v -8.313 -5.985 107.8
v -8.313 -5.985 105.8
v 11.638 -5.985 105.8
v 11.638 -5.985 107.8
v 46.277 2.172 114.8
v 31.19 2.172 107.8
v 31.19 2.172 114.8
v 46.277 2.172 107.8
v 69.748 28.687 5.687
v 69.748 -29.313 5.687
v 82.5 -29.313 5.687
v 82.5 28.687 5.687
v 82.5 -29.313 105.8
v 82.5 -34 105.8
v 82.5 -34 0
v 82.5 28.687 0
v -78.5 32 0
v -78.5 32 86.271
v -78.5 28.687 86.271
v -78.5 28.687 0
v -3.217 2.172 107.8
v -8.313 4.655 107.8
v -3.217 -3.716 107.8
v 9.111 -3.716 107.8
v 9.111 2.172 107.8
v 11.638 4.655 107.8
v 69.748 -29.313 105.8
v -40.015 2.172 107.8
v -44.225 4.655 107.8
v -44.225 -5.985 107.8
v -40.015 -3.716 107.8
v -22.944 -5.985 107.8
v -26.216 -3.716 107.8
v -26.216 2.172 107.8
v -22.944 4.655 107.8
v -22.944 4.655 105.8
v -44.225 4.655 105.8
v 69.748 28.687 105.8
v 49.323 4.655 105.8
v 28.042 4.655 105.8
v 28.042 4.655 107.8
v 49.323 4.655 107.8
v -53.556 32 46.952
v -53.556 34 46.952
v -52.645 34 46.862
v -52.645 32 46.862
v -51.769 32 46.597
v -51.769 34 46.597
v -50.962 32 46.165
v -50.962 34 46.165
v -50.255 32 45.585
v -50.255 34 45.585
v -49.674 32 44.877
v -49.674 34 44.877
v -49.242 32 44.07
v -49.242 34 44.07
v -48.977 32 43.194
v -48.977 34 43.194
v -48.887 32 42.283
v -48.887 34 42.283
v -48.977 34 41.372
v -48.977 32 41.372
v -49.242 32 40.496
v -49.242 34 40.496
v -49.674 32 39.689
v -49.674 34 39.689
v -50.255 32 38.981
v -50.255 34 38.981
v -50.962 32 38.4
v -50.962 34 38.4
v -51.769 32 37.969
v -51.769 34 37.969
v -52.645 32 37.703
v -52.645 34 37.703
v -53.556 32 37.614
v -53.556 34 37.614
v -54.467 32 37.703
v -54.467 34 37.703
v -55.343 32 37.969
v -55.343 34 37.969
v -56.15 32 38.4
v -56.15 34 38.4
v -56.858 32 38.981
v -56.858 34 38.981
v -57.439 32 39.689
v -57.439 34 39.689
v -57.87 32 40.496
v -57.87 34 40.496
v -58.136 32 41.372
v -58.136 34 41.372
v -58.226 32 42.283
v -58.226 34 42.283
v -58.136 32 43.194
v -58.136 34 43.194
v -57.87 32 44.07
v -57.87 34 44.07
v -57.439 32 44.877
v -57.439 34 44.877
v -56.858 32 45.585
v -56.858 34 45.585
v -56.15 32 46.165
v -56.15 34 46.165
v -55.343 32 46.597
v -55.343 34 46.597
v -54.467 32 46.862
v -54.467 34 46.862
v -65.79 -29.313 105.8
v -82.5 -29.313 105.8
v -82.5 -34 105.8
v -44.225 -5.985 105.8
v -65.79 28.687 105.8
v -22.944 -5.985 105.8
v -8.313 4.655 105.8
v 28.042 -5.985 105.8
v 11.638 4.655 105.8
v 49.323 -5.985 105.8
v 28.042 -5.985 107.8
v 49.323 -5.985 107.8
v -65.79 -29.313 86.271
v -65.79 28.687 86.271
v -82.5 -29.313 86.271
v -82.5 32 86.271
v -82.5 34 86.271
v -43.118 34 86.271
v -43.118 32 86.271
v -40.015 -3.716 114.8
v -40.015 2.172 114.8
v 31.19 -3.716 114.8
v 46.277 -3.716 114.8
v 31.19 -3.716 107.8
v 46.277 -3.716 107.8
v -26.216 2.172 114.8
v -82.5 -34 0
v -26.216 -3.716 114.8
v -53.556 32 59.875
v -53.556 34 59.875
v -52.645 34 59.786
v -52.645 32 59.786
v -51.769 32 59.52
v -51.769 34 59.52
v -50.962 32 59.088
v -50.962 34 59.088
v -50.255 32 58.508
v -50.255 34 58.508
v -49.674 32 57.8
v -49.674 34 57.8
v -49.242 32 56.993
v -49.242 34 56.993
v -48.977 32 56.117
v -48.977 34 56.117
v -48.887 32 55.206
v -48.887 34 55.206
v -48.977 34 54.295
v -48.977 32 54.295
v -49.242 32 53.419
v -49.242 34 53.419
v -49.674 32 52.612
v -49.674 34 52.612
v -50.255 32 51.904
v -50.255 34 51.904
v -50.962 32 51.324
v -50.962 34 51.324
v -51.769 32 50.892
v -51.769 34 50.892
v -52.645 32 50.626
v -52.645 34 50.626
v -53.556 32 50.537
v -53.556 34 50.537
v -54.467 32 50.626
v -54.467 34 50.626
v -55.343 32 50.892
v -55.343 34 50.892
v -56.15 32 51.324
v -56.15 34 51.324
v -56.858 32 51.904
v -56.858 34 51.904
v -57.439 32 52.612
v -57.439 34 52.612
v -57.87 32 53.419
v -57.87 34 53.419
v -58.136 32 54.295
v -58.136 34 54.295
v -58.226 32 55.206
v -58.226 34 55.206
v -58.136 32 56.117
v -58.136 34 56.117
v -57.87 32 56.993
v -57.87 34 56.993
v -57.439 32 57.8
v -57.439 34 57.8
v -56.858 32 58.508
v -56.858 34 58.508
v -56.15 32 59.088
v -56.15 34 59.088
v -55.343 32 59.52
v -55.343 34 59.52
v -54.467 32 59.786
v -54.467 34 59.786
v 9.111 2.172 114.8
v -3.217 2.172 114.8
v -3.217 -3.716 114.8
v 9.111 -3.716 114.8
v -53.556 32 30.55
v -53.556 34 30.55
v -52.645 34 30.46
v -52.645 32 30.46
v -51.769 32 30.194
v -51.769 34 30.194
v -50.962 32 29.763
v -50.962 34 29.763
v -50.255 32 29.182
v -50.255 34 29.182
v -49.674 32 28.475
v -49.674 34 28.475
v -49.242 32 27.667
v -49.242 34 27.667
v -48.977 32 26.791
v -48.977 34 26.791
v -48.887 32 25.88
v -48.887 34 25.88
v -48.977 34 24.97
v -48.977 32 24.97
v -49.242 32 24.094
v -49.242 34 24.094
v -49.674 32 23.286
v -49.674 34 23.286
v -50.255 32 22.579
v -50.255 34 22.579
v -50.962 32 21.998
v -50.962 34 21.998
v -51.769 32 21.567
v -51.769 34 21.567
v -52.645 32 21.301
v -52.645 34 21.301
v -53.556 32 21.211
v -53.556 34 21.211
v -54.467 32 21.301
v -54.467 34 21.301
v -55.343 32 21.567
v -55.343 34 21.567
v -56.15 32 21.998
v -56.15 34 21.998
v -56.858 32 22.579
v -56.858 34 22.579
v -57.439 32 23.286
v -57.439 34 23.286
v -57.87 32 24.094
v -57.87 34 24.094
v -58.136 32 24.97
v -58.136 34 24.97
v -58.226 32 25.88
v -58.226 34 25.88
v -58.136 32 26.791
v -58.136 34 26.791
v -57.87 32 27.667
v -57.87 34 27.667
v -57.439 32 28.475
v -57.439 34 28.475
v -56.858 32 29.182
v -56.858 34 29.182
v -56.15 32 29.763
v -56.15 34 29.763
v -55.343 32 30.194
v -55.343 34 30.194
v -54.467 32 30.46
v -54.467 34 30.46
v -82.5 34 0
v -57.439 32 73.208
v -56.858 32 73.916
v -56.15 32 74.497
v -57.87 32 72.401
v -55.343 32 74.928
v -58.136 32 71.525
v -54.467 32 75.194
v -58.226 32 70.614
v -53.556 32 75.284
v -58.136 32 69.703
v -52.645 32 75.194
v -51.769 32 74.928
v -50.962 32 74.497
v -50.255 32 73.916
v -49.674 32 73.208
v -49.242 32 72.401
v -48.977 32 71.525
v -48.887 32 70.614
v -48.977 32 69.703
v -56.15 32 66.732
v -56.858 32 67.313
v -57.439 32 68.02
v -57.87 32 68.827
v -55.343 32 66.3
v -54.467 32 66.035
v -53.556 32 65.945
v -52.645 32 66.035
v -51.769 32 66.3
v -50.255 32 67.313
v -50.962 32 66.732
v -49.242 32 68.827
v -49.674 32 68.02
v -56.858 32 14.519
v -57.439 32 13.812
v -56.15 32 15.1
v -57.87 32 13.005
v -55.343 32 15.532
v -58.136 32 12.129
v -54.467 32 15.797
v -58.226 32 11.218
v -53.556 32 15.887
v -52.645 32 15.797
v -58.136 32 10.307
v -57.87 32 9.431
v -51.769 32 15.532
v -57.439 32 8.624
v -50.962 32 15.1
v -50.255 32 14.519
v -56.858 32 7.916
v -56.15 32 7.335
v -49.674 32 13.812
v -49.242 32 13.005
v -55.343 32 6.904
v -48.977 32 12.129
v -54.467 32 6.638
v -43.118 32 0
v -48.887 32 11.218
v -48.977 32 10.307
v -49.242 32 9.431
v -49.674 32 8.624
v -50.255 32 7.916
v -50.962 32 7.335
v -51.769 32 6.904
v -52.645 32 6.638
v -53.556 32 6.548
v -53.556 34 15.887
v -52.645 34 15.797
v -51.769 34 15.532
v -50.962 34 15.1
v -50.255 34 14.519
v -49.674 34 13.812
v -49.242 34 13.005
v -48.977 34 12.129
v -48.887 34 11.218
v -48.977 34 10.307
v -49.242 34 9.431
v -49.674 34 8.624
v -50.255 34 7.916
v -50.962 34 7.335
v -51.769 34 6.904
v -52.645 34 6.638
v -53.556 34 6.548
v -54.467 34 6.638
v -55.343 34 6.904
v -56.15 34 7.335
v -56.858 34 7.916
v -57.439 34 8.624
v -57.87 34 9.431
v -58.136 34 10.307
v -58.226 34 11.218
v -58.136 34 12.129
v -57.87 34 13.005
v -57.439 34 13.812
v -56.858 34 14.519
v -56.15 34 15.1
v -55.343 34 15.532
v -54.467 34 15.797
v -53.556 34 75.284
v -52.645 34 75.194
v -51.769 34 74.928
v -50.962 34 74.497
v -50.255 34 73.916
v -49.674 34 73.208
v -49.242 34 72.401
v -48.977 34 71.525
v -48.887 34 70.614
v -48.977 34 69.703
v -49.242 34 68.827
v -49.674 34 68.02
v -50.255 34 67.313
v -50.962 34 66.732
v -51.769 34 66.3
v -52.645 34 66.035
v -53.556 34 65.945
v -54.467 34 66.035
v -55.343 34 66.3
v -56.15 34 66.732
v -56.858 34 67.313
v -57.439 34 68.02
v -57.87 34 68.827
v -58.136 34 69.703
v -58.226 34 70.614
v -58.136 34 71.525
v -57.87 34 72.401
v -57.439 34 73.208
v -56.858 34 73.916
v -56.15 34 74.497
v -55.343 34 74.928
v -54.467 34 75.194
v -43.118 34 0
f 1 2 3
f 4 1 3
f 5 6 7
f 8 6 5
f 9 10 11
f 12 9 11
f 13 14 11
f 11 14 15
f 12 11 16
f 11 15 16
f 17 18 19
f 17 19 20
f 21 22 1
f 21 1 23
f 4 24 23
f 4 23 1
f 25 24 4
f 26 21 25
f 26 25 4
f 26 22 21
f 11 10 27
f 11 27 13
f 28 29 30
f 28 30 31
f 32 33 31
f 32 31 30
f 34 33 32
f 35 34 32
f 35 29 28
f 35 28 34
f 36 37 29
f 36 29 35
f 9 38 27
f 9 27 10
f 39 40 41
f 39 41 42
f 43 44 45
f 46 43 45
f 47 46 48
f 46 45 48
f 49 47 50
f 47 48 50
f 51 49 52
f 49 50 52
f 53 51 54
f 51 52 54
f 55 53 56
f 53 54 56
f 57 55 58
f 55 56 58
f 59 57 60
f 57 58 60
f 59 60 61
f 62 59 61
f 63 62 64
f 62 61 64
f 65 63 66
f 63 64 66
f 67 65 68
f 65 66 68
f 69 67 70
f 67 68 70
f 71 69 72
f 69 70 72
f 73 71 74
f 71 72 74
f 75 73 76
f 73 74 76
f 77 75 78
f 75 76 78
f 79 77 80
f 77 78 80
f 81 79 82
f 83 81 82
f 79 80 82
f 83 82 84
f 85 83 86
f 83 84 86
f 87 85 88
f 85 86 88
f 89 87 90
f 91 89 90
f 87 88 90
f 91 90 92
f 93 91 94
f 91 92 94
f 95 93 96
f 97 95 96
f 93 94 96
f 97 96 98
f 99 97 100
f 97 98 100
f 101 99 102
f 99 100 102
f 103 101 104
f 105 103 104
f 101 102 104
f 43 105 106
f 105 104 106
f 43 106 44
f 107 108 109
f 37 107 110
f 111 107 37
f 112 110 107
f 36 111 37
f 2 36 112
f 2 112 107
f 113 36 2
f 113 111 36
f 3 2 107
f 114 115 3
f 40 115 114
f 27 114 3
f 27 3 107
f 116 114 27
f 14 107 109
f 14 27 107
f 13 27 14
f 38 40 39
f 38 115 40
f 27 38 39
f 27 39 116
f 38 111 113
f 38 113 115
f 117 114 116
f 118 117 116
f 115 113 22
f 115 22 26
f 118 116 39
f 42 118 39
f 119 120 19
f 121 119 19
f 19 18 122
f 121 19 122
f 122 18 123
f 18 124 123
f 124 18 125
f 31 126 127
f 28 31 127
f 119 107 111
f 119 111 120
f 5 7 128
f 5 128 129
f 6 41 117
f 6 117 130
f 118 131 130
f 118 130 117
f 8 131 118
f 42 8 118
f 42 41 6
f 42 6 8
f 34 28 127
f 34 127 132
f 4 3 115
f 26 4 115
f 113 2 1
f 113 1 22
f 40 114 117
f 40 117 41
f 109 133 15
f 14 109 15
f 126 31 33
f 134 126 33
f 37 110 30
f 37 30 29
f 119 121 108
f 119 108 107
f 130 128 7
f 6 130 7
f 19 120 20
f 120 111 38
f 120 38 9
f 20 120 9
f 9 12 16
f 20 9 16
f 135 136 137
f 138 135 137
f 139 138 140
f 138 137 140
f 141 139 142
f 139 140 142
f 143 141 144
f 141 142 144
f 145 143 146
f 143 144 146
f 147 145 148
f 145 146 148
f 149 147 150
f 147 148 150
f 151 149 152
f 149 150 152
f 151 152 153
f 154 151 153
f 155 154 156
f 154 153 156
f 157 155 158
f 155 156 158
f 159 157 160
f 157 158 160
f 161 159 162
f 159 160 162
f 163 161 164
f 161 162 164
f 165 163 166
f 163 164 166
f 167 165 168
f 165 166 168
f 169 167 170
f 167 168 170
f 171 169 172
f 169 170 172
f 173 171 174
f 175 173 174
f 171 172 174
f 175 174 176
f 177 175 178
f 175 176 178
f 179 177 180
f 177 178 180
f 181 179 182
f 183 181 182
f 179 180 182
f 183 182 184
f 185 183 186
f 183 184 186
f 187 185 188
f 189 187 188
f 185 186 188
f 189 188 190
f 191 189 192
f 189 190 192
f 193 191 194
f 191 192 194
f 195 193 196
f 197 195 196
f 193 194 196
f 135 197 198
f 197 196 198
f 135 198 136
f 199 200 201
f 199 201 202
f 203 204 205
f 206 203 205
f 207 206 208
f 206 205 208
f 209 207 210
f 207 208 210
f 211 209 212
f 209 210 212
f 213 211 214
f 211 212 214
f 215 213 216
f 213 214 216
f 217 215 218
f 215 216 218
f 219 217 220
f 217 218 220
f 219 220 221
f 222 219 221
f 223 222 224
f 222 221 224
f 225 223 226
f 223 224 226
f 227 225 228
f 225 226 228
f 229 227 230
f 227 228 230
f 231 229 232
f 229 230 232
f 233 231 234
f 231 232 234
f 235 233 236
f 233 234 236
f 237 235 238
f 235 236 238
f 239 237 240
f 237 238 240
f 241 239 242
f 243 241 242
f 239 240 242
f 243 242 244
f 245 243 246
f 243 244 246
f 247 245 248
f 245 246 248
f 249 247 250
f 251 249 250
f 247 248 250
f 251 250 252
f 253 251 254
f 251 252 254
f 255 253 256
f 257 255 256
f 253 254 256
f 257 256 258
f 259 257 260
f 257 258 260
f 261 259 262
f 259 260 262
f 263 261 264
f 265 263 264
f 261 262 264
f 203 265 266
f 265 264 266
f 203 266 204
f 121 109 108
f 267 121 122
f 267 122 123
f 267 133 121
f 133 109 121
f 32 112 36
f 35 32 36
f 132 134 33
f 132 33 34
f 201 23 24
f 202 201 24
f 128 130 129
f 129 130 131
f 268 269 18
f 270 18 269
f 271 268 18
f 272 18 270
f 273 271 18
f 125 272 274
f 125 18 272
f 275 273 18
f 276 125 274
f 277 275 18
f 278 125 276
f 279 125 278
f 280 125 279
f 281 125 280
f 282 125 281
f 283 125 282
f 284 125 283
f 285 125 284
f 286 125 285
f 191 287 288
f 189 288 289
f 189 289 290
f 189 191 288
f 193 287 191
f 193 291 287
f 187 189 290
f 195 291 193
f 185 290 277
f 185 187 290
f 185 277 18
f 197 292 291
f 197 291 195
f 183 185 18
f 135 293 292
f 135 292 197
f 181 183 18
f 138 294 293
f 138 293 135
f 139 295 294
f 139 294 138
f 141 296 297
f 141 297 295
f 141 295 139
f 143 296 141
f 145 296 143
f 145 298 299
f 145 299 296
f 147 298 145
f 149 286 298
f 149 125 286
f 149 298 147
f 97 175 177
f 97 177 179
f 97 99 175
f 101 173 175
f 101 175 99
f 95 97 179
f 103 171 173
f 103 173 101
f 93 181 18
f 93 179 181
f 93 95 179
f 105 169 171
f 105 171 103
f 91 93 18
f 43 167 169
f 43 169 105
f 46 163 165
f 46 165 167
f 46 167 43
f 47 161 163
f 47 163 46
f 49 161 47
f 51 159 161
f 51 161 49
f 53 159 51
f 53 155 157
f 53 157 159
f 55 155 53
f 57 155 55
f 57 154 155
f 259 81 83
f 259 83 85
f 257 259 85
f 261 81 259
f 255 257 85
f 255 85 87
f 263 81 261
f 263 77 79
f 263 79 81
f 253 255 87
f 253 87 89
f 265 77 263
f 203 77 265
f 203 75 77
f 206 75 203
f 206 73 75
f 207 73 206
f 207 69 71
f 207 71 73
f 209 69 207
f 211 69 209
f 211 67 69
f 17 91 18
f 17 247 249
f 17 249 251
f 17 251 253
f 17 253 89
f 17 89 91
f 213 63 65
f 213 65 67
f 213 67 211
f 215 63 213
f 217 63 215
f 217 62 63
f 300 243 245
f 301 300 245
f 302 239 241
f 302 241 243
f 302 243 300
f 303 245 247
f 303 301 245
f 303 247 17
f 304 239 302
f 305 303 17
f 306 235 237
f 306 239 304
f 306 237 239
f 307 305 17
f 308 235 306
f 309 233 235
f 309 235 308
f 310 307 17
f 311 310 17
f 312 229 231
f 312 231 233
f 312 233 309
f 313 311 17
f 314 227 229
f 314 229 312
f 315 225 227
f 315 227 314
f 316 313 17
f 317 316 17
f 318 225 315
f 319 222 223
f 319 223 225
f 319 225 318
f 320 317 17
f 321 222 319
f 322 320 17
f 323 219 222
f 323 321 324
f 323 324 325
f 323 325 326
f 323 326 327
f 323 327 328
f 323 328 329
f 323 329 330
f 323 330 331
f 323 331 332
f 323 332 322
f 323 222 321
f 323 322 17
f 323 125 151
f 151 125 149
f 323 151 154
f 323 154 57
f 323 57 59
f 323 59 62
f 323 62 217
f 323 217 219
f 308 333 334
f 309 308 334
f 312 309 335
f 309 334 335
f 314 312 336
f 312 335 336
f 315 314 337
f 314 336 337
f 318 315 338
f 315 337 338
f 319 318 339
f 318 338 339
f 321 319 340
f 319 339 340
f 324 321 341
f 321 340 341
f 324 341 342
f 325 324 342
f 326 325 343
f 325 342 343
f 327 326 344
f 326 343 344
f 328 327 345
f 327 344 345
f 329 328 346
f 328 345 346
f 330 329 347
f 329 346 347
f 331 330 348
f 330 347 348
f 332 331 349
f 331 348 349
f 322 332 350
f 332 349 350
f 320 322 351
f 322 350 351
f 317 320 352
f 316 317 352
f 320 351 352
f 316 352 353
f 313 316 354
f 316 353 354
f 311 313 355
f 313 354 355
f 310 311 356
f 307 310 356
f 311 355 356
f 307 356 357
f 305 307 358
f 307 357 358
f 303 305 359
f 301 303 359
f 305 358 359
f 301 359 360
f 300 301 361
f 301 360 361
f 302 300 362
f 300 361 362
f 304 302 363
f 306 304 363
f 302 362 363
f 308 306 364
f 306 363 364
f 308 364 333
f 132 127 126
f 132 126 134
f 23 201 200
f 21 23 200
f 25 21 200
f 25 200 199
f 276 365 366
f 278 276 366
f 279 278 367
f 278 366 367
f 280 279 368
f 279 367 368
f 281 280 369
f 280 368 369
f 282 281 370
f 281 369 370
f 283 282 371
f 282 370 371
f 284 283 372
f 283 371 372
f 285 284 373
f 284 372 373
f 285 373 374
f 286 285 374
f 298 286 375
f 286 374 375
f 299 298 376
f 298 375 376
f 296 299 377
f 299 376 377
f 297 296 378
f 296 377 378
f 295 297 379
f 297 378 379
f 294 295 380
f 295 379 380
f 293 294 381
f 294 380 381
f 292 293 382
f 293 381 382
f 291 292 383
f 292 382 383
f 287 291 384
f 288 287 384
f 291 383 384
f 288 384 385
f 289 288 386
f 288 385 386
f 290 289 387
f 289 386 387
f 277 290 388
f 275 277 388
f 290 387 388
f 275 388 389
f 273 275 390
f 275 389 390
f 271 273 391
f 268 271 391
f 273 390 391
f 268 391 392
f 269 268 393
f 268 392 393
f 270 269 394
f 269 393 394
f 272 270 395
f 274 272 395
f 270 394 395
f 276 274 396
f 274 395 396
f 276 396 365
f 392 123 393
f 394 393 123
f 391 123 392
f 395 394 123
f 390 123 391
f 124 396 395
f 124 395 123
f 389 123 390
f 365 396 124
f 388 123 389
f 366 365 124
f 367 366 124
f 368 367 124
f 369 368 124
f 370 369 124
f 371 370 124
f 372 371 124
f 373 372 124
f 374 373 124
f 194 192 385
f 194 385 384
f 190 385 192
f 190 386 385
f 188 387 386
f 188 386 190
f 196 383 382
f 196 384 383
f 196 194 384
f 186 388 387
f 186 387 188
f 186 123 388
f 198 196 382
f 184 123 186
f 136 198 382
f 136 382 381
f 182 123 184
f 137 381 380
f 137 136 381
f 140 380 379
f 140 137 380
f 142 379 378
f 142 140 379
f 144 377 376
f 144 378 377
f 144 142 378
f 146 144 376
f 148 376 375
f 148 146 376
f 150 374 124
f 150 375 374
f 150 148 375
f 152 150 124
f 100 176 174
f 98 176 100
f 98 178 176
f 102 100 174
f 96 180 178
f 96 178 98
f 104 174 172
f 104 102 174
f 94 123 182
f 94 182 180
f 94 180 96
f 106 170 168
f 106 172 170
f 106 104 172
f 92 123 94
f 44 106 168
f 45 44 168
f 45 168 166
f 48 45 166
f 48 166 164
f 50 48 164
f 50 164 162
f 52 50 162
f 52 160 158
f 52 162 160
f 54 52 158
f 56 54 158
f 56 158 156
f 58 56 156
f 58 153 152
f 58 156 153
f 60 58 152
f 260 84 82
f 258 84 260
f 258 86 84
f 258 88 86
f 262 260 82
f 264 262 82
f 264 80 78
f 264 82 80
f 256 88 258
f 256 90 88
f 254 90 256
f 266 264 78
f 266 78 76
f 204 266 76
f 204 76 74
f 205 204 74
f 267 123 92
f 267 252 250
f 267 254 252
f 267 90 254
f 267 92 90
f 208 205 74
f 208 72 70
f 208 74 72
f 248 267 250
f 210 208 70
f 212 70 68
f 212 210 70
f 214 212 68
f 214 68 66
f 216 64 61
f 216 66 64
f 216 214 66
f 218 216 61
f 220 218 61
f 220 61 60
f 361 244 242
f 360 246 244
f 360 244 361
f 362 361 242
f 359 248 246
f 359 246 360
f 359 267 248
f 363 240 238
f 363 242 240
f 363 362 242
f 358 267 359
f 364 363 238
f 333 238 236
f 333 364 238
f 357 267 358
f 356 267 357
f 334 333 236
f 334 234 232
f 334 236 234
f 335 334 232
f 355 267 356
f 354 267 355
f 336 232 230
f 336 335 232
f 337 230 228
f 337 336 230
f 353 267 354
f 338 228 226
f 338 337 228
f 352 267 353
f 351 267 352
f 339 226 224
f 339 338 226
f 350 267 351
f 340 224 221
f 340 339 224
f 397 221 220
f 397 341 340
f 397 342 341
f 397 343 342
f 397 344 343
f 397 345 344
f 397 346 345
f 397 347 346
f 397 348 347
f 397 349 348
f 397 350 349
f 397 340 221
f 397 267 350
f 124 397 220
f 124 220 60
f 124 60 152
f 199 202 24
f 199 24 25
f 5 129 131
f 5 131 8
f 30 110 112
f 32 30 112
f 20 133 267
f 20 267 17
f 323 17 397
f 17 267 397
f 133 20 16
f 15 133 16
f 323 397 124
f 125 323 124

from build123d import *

# Parameters (mm, degrees)
SKETCH_1_W               = 165
SKETCH_1_H               = 68
EXTRUDE_1_DEPTH          = 105.8
SKETCH_2_W               = 39.381596793
SKETCH_2_H               = 19.528929346
SKETCH_2_W_2             = 20.130205532
CUT_EXTRUDE_1_DEPTH      = 2
SKETCH_3_R               = 4.669286721
CUT_EXTRUDE_2_DEPTH      = 2
SKETCH_4_W               = 21.280991735
SKETCH_4_H               = 10.640495868
SKETCH_4_W_2             = 19.950929752
EXTRUDE_2_DEPTH          = 2
SKETCH_5_W               = 13.799393078
SKETCH_5_H               = 5.887741047
SKETCH_5_W_2             = 12.327457817
SKETCH_5_W_3             = 15.087336432
EXTRUDE_3_DEPTH          = 7
SKETCH_6_W               = 105.8
SKETCH_6_H               = 3.312578262
CUT_EXTRUDE_3_DEPTH      = 161
CUT_EXTRUDE_4_DEPTH      = 58
CUT_EXTRUDE_4_DEPTH_BACK = 58
SKETCH_7_W               = 16.710317156
SKETCH_7_H               = 19.528929346
SKETCH_8_W               = 20.11053719
SKETCH_8_H               = 105.021694215
CUT_EXTRUDE_5_DEPTH      = 58


with BuildPart() as part:
    # 草图1 → 凸台-拉伸1 (new body)
    with BuildSketch(Plane.XY):
        Rectangle(SKETCH_1_W, SKETCH_1_H)
    extrude(amount=EXTRUDE_1_DEPTH)

    # 草图2 → 切除-拉伸1 (cut)
    with BuildSketch(Plane(origin=(0, 34, 0), x_dir=(1, 0, 0), z_dir=(0, 1, 0))):
        with Locations((-62.809201604, -96.035535327)):
            Rectangle(SKETCH_2_W, SKETCH_2_H)
        with Locations((-33.053300441, -96.035535327)):
            Rectangle(SKETCH_2_W_2, SKETCH_2_H)
        Polygon((82.5, 0), (-43.118403207, 0), (-43.118403207, -86.271070654), (-22.988197675, -86.271070654), (-22.988197675, -105.8), (82.5, -105.8), align=None)
    extrude(amount=-CUT_EXTRUDE_1_DEPTH, mode=Mode.SUBTRACT)

    # 草图3 → 切除-拉伸2 (cut)
    with BuildSketch(Plane(origin=(0, 34, 0), x_dir=(1, 0, 0), z_dir=(0, 1, 0))):
        with Locations(Location((-53.556287556, -11.217711758, 0), (0, 0, 270))):
            Circle(SKETCH_3_R)
        with Locations(Location((-53.556287556, -25.880454059, 0), (0, 0, 270))):
            Circle(SKETCH_3_R)
        with Locations(Location((-53.556287556, -42.282843752, 0), (0, 0, 270))):
            Circle(SKETCH_3_R)
        with Locations(Location((-53.556287556, -55.205938661, 0), (0, 0, 270))):
            Circle(SKETCH_3_R)
        with Locations(Location((-53.556287556, -70.61424413, 0), (0, 0, 270))):
            Circle(SKETCH_3_R)
    extrude(amount=-CUT_EXTRUDE_2_DEPTH, mode=Mode.SUBTRACT)

    # 草图4 → 凸台-拉伸2 (add)
    with BuildSketch(Plane.XY.offset(105.8)):
        with Locations((-33.584065083, -0.665030992)):
            Rectangle(SKETCH_4_W, SKETCH_4_H)
        with Locations((1.662577479, -0.665030992)):
            Rectangle(SKETCH_4_W_2, SKETCH_4_H)
        with Locations((38.68263602, -0.665030992)):
            Rectangle(SKETCH_4_W, SKETCH_4_H)
    extrude(amount=EXTRUDE_2_DEPTH)

    # 草图5 → 凸台-拉伸3 (add)
    with BuildSketch(Plane.XY.offset(107.8)):
        with Locations((-33.115606168, -0.77221182)):
            Rectangle(SKETCH_5_W, SKETCH_5_H)
        with Locations((2.946807743, -0.77221182)):
            Rectangle(SKETCH_5_W_2, SKETCH_5_H)
        with Locations((38.733233794, -0.77221182)):
            Rectangle(SKETCH_5_W_3, SKETCH_5_H)
    extrude(amount=EXTRUDE_3_DEPTH)

    # 草图6 → 切除-拉伸3 (cut)
    with BuildSketch(Plane(origin=(82.5, 0, 0), x_dir=(0, 0, -1), z_dir=(1, 0, 0))):
        with Locations((-52.9, 30.343710869)):
            Rectangle(SKETCH_6_W, SKETCH_6_H)
    extrude(amount=-CUT_EXTRUDE_3_DEPTH, mode=Mode.SUBTRACT)

    # 草图7 → 切除-拉伸4 (cut, two sides: drawn at the far end of the back side and taken through both)
    with BuildSketch(Plane(origin=(0, 28.687421738, 0), x_dir=(1, 0, 0), z_dir=(0, 1, 0)).offset(-CUT_EXTRUDE_4_DEPTH_BACK)):
        with Locations((-74.144841422, -96.035535327)):
            Rectangle(SKETCH_7_W, SKETCH_7_H)
    extrude(amount=CUT_EXTRUDE_4_DEPTH + CUT_EXTRUDE_4_DEPTH_BACK, mode=Mode.SUBTRACT)

    # 草图8 → 切除-拉伸5 (cut)
    with BuildSketch(Plane(origin=(0, 28.687421738, 0), x_dir=(1, 0, 0), z_dir=(0, 1, 0))):
        with Locations((79.803719008, -58.198037191)):
            Rectangle(SKETCH_8_W, SKETCH_8_H)
    extrude(amount=-CUT_EXTRUDE_5_DEPTH, mode=Mode.SUBTRACT)


solid = part.part
